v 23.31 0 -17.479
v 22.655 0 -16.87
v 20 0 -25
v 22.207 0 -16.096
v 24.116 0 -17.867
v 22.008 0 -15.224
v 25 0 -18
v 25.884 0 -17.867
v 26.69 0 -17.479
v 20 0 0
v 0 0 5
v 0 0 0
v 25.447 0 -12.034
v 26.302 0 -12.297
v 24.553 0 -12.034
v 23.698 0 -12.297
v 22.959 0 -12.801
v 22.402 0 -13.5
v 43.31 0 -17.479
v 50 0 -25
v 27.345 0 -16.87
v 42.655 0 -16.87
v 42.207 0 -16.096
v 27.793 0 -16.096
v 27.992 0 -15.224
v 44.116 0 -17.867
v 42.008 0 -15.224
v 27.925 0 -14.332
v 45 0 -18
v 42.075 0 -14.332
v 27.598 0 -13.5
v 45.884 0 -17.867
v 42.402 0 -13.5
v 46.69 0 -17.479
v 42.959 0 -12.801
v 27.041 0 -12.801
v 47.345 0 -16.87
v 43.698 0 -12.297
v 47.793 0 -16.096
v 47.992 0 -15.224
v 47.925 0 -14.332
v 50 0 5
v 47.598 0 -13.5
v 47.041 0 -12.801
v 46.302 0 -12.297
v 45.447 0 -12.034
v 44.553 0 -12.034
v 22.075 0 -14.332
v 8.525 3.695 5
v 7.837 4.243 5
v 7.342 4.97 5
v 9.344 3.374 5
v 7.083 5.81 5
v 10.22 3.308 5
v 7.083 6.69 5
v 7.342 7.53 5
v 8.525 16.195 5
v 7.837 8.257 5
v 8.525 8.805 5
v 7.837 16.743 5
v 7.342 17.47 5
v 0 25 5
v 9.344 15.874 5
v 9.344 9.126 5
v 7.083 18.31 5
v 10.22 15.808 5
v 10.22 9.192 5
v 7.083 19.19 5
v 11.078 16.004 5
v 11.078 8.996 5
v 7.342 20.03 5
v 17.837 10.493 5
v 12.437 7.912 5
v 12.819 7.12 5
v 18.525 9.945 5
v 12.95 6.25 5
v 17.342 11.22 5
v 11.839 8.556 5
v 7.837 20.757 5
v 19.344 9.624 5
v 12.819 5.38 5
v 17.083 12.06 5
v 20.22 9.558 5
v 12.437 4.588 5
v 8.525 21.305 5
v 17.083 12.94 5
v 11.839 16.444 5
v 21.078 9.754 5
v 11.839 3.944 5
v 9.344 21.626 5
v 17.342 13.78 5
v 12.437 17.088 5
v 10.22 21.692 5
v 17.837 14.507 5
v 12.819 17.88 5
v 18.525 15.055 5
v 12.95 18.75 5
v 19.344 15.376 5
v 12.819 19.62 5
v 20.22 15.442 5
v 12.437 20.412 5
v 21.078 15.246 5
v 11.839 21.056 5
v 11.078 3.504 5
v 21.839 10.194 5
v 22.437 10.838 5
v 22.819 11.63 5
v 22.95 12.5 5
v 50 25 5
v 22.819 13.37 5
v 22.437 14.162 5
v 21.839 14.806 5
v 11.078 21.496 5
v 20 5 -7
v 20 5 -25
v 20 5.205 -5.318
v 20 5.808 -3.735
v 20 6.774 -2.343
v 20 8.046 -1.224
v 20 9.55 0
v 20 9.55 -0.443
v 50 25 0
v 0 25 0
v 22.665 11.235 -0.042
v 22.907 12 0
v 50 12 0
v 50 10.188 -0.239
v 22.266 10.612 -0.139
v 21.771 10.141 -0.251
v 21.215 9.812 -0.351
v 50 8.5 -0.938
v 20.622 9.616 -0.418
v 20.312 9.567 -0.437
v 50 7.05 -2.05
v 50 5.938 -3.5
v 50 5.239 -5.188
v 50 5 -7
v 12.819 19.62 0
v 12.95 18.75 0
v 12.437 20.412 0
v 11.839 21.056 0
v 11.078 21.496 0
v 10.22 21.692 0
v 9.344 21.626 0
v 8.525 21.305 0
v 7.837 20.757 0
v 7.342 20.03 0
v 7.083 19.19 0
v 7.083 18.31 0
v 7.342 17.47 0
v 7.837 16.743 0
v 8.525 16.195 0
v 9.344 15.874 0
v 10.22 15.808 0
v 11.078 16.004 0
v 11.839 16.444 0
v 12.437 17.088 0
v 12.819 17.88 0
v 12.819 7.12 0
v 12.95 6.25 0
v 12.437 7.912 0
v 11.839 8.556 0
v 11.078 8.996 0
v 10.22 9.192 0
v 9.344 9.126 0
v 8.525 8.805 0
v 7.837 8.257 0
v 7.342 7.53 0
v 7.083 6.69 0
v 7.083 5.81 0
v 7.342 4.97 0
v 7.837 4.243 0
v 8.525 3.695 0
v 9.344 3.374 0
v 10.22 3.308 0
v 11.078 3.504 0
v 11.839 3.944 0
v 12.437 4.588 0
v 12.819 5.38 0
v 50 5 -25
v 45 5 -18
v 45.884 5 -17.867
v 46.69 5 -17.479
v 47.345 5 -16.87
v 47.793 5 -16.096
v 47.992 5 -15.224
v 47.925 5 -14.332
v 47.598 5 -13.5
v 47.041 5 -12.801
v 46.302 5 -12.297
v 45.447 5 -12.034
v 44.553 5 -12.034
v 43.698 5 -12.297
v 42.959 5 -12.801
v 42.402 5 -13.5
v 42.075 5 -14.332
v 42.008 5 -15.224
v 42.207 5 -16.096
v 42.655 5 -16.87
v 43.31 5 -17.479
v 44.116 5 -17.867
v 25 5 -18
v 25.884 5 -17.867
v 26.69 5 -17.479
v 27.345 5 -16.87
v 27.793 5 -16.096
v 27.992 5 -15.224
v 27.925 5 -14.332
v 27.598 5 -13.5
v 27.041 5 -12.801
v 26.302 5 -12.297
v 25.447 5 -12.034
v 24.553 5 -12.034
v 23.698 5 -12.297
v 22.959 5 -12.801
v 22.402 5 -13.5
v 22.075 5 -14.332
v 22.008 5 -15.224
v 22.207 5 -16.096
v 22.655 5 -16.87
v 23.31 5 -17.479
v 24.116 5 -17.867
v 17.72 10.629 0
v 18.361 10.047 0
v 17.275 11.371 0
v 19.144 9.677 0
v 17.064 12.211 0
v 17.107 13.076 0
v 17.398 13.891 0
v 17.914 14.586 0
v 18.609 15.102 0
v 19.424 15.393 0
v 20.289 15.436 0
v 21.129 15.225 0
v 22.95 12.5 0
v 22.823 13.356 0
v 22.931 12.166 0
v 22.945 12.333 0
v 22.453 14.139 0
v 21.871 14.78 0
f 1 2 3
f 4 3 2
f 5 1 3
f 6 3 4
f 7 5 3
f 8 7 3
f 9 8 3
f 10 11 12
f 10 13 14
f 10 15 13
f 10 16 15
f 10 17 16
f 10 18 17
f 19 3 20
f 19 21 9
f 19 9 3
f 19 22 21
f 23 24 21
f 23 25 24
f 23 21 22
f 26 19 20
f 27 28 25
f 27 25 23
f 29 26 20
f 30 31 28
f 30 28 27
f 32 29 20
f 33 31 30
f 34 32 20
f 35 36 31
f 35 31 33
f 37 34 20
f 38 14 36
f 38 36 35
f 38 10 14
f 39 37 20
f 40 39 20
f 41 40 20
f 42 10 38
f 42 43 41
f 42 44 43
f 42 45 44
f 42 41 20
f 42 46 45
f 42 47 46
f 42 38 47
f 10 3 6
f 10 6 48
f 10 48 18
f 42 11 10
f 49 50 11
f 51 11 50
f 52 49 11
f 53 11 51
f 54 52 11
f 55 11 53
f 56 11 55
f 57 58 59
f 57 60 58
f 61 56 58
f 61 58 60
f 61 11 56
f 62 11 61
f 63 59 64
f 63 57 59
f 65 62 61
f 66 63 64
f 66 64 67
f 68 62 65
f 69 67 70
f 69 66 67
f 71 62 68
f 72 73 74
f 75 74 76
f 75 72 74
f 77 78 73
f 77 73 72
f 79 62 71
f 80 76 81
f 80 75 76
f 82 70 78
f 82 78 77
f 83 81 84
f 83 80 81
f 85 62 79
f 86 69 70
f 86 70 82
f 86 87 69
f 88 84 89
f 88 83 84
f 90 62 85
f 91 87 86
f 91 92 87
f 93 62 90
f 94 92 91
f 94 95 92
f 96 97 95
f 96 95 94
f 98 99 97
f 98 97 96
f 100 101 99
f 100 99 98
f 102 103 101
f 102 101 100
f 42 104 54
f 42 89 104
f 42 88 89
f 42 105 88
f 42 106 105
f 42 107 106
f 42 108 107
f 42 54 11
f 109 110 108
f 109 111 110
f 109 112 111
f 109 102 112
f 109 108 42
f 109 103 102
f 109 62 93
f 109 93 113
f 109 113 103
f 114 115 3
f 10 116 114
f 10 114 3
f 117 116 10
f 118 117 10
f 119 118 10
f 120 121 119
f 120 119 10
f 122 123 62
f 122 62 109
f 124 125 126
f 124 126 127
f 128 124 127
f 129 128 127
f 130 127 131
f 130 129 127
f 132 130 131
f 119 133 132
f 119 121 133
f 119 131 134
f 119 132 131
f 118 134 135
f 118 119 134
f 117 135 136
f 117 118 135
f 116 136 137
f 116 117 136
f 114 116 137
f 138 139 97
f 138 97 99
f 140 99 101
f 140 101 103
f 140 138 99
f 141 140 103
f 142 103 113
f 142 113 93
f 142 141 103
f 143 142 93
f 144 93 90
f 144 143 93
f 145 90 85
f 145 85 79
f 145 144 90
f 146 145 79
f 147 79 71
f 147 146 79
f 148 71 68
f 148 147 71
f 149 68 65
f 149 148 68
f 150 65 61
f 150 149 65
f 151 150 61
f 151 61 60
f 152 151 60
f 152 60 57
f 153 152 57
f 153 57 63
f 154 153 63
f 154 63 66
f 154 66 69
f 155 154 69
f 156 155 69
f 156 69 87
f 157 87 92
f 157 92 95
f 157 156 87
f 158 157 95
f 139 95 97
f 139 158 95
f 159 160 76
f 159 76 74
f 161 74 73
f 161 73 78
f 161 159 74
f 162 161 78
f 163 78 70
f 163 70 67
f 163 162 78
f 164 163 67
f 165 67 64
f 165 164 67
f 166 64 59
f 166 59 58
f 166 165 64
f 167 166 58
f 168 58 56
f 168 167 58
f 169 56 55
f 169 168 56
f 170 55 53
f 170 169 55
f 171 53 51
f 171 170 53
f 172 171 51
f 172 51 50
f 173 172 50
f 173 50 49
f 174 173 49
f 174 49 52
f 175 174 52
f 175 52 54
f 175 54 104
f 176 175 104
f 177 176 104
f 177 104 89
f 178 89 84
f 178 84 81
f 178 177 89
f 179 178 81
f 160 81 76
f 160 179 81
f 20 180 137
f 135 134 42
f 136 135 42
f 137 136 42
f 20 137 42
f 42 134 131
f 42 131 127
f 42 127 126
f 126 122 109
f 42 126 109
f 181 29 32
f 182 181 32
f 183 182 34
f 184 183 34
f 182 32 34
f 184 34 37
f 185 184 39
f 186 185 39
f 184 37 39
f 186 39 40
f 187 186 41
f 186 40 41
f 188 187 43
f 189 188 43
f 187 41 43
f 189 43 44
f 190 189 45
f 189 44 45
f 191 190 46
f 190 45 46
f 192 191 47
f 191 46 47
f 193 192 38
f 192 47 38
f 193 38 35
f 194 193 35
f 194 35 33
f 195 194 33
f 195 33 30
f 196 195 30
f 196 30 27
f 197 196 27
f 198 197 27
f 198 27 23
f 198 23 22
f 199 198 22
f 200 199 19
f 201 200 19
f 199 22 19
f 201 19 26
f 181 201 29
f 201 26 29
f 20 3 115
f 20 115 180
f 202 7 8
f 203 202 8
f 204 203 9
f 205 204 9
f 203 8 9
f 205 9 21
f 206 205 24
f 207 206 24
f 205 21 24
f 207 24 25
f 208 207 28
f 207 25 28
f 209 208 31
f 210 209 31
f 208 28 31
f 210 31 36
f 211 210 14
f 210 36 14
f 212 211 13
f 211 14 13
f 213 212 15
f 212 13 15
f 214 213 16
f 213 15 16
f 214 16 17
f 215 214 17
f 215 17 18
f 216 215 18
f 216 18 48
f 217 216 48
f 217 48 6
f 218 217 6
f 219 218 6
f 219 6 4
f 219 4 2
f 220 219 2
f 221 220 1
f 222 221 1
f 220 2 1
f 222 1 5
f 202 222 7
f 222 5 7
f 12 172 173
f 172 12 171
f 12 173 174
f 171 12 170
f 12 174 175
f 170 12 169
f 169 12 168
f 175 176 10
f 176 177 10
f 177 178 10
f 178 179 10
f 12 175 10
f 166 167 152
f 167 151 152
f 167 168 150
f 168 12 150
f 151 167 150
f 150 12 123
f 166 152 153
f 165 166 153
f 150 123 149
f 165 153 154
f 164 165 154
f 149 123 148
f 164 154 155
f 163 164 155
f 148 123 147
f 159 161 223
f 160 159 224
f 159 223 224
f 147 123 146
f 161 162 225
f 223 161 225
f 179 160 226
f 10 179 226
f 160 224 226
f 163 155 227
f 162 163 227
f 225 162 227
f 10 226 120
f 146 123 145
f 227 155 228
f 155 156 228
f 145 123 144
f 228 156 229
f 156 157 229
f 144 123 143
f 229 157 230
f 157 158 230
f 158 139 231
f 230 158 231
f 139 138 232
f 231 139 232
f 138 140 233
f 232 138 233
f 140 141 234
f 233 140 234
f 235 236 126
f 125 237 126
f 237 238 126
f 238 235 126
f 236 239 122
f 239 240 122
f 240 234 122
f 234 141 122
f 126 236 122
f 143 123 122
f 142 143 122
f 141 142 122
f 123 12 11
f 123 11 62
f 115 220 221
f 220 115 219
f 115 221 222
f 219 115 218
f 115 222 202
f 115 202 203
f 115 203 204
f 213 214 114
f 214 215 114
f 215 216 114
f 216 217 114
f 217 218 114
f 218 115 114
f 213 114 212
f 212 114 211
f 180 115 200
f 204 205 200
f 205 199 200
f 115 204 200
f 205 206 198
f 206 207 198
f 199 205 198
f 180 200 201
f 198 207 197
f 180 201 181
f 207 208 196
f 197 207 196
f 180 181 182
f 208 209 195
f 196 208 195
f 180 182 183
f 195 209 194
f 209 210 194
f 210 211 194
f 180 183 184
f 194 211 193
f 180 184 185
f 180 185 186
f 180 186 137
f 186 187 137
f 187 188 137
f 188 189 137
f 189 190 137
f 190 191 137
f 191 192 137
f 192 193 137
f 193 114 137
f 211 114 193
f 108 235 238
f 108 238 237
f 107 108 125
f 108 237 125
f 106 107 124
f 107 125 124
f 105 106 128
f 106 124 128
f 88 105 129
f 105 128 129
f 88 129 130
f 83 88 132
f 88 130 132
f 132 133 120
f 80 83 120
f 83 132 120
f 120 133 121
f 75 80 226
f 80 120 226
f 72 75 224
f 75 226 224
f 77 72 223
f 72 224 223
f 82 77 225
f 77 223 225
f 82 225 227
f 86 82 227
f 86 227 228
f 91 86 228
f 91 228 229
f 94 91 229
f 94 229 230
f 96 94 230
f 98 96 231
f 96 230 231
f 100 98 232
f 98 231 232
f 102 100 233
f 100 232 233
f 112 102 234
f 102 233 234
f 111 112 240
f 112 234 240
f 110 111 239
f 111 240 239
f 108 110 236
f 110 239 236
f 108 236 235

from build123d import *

# Parameters (mm, degrees)
CROQUIS1_W              = 50
CROQUIS1_H              = 25
CROQUIS1_R              = 2.95
SALIENTE_EXTRUIR1_DEPTH = 5
CROQUIS2_W              = 30
CROQUIS2_H              = 25
CROQUIS2_R              = 3
SALIENTE_EXTRUIR2_DEPTH = 5
REDONDEO1_R             = 7


with BuildPart() as part:
    # Croquis1 → Saliente-Extruir1 (new body)
    with BuildSketch(Plane.XY):
        with Locations((25, 12.5)):
            Rectangle(CROQUIS1_W, CROQUIS1_H)
        with Locations((10, 18.75)):
            Circle(CROQUIS1_R, mode=Mode.SUBTRACT)
        with Locations((10, 6.25)):
            Circle(CROQUIS1_R, mode=Mode.SUBTRACT)
        with Locations((20, 12.5)):
            Circle(CROQUIS1_R, mode=Mode.SUBTRACT)
    extrude(amount=SALIENTE_EXTRUIR1_DEPTH)

    # Croquis2 → Saliente-Extruir2 (add)
    with BuildSketch(Plane.XZ):
        with Locations((35, -12.5)):
            Rectangle(CROQUIS2_W, CROQUIS2_H)
        with Locations(Location((45, -15, 0), (0, 0, 270))):
            Circle(CROQUIS2_R, mode=Mode.SUBTRACT)
        with Locations(Location((25, -15, 0), (0, 0, 270))):
            Circle(CROQUIS2_R, mode=Mode.SUBTRACT)
    extrude(amount=-SALIENTE_EXTRUIR2_DEPTH)

    # Redondeo1
    # the kernel refuses this fillet: 7 mm, written as the material it adds along each edge
    with BuildSketch(Plane(origin=(20, 5, 0), x_dir=(0, 0, -1), z_dir=(1, 0, 0))) as redondeo1_piece_1_section:
        with BuildLine():
            CenterArc((REDONDEO1_R, REDONDEO1_R), REDONDEO1_R, 180, 90)
            Line((0, REDONDEO1_R), (0, 0))
            Line((0, 0), (REDONDEO1_R, 0))
        make_face()
    redondeo1_piece_1 = extrude(amount=30, mode=Mode.PRIVATE)
    redondeo1_piece_1 = redondeo1_piece_1 - Plane(origin=(20, 12.5, -1.59035859), x_dir=(1, 0, 0), z_dir=(0, 0, -1)) * Cylinder(2.95, 88, mode=Mode.PRIVATE)
    add(redondeo1_piece_1)


solid = part.part
